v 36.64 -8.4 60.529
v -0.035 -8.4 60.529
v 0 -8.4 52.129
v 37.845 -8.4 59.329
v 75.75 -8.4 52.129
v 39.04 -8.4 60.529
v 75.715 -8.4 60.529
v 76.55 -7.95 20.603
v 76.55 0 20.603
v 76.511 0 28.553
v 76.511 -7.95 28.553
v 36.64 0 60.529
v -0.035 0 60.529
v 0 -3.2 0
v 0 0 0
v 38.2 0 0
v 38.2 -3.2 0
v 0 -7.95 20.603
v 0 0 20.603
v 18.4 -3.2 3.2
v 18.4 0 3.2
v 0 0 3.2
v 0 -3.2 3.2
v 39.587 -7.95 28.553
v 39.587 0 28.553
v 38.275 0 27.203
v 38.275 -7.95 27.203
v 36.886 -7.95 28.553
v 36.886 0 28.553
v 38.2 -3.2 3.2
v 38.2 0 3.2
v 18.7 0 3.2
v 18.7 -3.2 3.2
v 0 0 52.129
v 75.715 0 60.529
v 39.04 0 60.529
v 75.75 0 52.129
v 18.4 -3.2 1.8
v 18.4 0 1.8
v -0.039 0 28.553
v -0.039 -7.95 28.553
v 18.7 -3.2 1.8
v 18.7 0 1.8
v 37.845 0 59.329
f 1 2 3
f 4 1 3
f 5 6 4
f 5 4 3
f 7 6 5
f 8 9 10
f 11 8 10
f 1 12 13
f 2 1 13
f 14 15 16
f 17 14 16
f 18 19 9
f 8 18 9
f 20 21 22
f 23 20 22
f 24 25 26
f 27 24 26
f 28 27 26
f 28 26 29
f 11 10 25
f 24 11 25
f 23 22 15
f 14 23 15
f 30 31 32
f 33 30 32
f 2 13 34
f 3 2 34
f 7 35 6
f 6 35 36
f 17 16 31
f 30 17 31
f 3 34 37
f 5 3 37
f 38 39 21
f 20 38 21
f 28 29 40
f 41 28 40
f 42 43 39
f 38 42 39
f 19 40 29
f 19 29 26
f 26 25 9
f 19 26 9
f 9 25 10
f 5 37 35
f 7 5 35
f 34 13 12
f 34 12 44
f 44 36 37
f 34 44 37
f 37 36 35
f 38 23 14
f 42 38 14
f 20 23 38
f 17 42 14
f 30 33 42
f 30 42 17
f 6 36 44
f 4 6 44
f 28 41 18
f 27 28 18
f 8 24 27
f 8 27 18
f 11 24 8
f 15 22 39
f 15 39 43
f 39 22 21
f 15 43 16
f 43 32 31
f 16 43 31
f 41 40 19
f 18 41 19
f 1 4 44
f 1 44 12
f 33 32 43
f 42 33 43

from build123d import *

# Parameters (mm, degrees)
F1_DEPTH = 3.2
F3_DEPTH = 7.95
F5_DEPTH = 8.4


with BuildPart() as f1:
    # F0 (on Front) → F1 (new body)
    with BuildSketch(Plane.XZ):
        Polygon((0, 3.2), (0, 0), (38.2, 0), (38.2, 3.2), (18.7, 3.2), (18.7, 1.8), (18.4, 1.8), (18.4, 3.2), align=None)
    extrude(amount=F1_DEPTH)


with BuildPart() as f3:
    # F2 (on Front) → F3 (new body)
    with BuildSketch(Plane.XZ):
        Polygon((-0.038534, 28.55267), (0, 20.602763), (76.55, 20.602763), (76.511466, 28.55267), (39.586922, 28.55267), (38.275, 27.202763), (36.886009, 28.55267), align=None)
    extrude(amount=F3_DEPTH)


with BuildPart() as f5:
    # F4 (on Front) → F5 (new body)
    with BuildSketch(Plane.XZ):
        Polygon((-0.034754, 60.52913), (0, 52.129202), (75.75, 52.129202), (75.715246, 60.52913), (39.040246, 60.52913), (37.845211, 59.32914), (36.640246, 60.52913), align=None)
    extrude(amount=F5_DEPTH)


solid = Compound([f1.part, f3.part, f5.part])
